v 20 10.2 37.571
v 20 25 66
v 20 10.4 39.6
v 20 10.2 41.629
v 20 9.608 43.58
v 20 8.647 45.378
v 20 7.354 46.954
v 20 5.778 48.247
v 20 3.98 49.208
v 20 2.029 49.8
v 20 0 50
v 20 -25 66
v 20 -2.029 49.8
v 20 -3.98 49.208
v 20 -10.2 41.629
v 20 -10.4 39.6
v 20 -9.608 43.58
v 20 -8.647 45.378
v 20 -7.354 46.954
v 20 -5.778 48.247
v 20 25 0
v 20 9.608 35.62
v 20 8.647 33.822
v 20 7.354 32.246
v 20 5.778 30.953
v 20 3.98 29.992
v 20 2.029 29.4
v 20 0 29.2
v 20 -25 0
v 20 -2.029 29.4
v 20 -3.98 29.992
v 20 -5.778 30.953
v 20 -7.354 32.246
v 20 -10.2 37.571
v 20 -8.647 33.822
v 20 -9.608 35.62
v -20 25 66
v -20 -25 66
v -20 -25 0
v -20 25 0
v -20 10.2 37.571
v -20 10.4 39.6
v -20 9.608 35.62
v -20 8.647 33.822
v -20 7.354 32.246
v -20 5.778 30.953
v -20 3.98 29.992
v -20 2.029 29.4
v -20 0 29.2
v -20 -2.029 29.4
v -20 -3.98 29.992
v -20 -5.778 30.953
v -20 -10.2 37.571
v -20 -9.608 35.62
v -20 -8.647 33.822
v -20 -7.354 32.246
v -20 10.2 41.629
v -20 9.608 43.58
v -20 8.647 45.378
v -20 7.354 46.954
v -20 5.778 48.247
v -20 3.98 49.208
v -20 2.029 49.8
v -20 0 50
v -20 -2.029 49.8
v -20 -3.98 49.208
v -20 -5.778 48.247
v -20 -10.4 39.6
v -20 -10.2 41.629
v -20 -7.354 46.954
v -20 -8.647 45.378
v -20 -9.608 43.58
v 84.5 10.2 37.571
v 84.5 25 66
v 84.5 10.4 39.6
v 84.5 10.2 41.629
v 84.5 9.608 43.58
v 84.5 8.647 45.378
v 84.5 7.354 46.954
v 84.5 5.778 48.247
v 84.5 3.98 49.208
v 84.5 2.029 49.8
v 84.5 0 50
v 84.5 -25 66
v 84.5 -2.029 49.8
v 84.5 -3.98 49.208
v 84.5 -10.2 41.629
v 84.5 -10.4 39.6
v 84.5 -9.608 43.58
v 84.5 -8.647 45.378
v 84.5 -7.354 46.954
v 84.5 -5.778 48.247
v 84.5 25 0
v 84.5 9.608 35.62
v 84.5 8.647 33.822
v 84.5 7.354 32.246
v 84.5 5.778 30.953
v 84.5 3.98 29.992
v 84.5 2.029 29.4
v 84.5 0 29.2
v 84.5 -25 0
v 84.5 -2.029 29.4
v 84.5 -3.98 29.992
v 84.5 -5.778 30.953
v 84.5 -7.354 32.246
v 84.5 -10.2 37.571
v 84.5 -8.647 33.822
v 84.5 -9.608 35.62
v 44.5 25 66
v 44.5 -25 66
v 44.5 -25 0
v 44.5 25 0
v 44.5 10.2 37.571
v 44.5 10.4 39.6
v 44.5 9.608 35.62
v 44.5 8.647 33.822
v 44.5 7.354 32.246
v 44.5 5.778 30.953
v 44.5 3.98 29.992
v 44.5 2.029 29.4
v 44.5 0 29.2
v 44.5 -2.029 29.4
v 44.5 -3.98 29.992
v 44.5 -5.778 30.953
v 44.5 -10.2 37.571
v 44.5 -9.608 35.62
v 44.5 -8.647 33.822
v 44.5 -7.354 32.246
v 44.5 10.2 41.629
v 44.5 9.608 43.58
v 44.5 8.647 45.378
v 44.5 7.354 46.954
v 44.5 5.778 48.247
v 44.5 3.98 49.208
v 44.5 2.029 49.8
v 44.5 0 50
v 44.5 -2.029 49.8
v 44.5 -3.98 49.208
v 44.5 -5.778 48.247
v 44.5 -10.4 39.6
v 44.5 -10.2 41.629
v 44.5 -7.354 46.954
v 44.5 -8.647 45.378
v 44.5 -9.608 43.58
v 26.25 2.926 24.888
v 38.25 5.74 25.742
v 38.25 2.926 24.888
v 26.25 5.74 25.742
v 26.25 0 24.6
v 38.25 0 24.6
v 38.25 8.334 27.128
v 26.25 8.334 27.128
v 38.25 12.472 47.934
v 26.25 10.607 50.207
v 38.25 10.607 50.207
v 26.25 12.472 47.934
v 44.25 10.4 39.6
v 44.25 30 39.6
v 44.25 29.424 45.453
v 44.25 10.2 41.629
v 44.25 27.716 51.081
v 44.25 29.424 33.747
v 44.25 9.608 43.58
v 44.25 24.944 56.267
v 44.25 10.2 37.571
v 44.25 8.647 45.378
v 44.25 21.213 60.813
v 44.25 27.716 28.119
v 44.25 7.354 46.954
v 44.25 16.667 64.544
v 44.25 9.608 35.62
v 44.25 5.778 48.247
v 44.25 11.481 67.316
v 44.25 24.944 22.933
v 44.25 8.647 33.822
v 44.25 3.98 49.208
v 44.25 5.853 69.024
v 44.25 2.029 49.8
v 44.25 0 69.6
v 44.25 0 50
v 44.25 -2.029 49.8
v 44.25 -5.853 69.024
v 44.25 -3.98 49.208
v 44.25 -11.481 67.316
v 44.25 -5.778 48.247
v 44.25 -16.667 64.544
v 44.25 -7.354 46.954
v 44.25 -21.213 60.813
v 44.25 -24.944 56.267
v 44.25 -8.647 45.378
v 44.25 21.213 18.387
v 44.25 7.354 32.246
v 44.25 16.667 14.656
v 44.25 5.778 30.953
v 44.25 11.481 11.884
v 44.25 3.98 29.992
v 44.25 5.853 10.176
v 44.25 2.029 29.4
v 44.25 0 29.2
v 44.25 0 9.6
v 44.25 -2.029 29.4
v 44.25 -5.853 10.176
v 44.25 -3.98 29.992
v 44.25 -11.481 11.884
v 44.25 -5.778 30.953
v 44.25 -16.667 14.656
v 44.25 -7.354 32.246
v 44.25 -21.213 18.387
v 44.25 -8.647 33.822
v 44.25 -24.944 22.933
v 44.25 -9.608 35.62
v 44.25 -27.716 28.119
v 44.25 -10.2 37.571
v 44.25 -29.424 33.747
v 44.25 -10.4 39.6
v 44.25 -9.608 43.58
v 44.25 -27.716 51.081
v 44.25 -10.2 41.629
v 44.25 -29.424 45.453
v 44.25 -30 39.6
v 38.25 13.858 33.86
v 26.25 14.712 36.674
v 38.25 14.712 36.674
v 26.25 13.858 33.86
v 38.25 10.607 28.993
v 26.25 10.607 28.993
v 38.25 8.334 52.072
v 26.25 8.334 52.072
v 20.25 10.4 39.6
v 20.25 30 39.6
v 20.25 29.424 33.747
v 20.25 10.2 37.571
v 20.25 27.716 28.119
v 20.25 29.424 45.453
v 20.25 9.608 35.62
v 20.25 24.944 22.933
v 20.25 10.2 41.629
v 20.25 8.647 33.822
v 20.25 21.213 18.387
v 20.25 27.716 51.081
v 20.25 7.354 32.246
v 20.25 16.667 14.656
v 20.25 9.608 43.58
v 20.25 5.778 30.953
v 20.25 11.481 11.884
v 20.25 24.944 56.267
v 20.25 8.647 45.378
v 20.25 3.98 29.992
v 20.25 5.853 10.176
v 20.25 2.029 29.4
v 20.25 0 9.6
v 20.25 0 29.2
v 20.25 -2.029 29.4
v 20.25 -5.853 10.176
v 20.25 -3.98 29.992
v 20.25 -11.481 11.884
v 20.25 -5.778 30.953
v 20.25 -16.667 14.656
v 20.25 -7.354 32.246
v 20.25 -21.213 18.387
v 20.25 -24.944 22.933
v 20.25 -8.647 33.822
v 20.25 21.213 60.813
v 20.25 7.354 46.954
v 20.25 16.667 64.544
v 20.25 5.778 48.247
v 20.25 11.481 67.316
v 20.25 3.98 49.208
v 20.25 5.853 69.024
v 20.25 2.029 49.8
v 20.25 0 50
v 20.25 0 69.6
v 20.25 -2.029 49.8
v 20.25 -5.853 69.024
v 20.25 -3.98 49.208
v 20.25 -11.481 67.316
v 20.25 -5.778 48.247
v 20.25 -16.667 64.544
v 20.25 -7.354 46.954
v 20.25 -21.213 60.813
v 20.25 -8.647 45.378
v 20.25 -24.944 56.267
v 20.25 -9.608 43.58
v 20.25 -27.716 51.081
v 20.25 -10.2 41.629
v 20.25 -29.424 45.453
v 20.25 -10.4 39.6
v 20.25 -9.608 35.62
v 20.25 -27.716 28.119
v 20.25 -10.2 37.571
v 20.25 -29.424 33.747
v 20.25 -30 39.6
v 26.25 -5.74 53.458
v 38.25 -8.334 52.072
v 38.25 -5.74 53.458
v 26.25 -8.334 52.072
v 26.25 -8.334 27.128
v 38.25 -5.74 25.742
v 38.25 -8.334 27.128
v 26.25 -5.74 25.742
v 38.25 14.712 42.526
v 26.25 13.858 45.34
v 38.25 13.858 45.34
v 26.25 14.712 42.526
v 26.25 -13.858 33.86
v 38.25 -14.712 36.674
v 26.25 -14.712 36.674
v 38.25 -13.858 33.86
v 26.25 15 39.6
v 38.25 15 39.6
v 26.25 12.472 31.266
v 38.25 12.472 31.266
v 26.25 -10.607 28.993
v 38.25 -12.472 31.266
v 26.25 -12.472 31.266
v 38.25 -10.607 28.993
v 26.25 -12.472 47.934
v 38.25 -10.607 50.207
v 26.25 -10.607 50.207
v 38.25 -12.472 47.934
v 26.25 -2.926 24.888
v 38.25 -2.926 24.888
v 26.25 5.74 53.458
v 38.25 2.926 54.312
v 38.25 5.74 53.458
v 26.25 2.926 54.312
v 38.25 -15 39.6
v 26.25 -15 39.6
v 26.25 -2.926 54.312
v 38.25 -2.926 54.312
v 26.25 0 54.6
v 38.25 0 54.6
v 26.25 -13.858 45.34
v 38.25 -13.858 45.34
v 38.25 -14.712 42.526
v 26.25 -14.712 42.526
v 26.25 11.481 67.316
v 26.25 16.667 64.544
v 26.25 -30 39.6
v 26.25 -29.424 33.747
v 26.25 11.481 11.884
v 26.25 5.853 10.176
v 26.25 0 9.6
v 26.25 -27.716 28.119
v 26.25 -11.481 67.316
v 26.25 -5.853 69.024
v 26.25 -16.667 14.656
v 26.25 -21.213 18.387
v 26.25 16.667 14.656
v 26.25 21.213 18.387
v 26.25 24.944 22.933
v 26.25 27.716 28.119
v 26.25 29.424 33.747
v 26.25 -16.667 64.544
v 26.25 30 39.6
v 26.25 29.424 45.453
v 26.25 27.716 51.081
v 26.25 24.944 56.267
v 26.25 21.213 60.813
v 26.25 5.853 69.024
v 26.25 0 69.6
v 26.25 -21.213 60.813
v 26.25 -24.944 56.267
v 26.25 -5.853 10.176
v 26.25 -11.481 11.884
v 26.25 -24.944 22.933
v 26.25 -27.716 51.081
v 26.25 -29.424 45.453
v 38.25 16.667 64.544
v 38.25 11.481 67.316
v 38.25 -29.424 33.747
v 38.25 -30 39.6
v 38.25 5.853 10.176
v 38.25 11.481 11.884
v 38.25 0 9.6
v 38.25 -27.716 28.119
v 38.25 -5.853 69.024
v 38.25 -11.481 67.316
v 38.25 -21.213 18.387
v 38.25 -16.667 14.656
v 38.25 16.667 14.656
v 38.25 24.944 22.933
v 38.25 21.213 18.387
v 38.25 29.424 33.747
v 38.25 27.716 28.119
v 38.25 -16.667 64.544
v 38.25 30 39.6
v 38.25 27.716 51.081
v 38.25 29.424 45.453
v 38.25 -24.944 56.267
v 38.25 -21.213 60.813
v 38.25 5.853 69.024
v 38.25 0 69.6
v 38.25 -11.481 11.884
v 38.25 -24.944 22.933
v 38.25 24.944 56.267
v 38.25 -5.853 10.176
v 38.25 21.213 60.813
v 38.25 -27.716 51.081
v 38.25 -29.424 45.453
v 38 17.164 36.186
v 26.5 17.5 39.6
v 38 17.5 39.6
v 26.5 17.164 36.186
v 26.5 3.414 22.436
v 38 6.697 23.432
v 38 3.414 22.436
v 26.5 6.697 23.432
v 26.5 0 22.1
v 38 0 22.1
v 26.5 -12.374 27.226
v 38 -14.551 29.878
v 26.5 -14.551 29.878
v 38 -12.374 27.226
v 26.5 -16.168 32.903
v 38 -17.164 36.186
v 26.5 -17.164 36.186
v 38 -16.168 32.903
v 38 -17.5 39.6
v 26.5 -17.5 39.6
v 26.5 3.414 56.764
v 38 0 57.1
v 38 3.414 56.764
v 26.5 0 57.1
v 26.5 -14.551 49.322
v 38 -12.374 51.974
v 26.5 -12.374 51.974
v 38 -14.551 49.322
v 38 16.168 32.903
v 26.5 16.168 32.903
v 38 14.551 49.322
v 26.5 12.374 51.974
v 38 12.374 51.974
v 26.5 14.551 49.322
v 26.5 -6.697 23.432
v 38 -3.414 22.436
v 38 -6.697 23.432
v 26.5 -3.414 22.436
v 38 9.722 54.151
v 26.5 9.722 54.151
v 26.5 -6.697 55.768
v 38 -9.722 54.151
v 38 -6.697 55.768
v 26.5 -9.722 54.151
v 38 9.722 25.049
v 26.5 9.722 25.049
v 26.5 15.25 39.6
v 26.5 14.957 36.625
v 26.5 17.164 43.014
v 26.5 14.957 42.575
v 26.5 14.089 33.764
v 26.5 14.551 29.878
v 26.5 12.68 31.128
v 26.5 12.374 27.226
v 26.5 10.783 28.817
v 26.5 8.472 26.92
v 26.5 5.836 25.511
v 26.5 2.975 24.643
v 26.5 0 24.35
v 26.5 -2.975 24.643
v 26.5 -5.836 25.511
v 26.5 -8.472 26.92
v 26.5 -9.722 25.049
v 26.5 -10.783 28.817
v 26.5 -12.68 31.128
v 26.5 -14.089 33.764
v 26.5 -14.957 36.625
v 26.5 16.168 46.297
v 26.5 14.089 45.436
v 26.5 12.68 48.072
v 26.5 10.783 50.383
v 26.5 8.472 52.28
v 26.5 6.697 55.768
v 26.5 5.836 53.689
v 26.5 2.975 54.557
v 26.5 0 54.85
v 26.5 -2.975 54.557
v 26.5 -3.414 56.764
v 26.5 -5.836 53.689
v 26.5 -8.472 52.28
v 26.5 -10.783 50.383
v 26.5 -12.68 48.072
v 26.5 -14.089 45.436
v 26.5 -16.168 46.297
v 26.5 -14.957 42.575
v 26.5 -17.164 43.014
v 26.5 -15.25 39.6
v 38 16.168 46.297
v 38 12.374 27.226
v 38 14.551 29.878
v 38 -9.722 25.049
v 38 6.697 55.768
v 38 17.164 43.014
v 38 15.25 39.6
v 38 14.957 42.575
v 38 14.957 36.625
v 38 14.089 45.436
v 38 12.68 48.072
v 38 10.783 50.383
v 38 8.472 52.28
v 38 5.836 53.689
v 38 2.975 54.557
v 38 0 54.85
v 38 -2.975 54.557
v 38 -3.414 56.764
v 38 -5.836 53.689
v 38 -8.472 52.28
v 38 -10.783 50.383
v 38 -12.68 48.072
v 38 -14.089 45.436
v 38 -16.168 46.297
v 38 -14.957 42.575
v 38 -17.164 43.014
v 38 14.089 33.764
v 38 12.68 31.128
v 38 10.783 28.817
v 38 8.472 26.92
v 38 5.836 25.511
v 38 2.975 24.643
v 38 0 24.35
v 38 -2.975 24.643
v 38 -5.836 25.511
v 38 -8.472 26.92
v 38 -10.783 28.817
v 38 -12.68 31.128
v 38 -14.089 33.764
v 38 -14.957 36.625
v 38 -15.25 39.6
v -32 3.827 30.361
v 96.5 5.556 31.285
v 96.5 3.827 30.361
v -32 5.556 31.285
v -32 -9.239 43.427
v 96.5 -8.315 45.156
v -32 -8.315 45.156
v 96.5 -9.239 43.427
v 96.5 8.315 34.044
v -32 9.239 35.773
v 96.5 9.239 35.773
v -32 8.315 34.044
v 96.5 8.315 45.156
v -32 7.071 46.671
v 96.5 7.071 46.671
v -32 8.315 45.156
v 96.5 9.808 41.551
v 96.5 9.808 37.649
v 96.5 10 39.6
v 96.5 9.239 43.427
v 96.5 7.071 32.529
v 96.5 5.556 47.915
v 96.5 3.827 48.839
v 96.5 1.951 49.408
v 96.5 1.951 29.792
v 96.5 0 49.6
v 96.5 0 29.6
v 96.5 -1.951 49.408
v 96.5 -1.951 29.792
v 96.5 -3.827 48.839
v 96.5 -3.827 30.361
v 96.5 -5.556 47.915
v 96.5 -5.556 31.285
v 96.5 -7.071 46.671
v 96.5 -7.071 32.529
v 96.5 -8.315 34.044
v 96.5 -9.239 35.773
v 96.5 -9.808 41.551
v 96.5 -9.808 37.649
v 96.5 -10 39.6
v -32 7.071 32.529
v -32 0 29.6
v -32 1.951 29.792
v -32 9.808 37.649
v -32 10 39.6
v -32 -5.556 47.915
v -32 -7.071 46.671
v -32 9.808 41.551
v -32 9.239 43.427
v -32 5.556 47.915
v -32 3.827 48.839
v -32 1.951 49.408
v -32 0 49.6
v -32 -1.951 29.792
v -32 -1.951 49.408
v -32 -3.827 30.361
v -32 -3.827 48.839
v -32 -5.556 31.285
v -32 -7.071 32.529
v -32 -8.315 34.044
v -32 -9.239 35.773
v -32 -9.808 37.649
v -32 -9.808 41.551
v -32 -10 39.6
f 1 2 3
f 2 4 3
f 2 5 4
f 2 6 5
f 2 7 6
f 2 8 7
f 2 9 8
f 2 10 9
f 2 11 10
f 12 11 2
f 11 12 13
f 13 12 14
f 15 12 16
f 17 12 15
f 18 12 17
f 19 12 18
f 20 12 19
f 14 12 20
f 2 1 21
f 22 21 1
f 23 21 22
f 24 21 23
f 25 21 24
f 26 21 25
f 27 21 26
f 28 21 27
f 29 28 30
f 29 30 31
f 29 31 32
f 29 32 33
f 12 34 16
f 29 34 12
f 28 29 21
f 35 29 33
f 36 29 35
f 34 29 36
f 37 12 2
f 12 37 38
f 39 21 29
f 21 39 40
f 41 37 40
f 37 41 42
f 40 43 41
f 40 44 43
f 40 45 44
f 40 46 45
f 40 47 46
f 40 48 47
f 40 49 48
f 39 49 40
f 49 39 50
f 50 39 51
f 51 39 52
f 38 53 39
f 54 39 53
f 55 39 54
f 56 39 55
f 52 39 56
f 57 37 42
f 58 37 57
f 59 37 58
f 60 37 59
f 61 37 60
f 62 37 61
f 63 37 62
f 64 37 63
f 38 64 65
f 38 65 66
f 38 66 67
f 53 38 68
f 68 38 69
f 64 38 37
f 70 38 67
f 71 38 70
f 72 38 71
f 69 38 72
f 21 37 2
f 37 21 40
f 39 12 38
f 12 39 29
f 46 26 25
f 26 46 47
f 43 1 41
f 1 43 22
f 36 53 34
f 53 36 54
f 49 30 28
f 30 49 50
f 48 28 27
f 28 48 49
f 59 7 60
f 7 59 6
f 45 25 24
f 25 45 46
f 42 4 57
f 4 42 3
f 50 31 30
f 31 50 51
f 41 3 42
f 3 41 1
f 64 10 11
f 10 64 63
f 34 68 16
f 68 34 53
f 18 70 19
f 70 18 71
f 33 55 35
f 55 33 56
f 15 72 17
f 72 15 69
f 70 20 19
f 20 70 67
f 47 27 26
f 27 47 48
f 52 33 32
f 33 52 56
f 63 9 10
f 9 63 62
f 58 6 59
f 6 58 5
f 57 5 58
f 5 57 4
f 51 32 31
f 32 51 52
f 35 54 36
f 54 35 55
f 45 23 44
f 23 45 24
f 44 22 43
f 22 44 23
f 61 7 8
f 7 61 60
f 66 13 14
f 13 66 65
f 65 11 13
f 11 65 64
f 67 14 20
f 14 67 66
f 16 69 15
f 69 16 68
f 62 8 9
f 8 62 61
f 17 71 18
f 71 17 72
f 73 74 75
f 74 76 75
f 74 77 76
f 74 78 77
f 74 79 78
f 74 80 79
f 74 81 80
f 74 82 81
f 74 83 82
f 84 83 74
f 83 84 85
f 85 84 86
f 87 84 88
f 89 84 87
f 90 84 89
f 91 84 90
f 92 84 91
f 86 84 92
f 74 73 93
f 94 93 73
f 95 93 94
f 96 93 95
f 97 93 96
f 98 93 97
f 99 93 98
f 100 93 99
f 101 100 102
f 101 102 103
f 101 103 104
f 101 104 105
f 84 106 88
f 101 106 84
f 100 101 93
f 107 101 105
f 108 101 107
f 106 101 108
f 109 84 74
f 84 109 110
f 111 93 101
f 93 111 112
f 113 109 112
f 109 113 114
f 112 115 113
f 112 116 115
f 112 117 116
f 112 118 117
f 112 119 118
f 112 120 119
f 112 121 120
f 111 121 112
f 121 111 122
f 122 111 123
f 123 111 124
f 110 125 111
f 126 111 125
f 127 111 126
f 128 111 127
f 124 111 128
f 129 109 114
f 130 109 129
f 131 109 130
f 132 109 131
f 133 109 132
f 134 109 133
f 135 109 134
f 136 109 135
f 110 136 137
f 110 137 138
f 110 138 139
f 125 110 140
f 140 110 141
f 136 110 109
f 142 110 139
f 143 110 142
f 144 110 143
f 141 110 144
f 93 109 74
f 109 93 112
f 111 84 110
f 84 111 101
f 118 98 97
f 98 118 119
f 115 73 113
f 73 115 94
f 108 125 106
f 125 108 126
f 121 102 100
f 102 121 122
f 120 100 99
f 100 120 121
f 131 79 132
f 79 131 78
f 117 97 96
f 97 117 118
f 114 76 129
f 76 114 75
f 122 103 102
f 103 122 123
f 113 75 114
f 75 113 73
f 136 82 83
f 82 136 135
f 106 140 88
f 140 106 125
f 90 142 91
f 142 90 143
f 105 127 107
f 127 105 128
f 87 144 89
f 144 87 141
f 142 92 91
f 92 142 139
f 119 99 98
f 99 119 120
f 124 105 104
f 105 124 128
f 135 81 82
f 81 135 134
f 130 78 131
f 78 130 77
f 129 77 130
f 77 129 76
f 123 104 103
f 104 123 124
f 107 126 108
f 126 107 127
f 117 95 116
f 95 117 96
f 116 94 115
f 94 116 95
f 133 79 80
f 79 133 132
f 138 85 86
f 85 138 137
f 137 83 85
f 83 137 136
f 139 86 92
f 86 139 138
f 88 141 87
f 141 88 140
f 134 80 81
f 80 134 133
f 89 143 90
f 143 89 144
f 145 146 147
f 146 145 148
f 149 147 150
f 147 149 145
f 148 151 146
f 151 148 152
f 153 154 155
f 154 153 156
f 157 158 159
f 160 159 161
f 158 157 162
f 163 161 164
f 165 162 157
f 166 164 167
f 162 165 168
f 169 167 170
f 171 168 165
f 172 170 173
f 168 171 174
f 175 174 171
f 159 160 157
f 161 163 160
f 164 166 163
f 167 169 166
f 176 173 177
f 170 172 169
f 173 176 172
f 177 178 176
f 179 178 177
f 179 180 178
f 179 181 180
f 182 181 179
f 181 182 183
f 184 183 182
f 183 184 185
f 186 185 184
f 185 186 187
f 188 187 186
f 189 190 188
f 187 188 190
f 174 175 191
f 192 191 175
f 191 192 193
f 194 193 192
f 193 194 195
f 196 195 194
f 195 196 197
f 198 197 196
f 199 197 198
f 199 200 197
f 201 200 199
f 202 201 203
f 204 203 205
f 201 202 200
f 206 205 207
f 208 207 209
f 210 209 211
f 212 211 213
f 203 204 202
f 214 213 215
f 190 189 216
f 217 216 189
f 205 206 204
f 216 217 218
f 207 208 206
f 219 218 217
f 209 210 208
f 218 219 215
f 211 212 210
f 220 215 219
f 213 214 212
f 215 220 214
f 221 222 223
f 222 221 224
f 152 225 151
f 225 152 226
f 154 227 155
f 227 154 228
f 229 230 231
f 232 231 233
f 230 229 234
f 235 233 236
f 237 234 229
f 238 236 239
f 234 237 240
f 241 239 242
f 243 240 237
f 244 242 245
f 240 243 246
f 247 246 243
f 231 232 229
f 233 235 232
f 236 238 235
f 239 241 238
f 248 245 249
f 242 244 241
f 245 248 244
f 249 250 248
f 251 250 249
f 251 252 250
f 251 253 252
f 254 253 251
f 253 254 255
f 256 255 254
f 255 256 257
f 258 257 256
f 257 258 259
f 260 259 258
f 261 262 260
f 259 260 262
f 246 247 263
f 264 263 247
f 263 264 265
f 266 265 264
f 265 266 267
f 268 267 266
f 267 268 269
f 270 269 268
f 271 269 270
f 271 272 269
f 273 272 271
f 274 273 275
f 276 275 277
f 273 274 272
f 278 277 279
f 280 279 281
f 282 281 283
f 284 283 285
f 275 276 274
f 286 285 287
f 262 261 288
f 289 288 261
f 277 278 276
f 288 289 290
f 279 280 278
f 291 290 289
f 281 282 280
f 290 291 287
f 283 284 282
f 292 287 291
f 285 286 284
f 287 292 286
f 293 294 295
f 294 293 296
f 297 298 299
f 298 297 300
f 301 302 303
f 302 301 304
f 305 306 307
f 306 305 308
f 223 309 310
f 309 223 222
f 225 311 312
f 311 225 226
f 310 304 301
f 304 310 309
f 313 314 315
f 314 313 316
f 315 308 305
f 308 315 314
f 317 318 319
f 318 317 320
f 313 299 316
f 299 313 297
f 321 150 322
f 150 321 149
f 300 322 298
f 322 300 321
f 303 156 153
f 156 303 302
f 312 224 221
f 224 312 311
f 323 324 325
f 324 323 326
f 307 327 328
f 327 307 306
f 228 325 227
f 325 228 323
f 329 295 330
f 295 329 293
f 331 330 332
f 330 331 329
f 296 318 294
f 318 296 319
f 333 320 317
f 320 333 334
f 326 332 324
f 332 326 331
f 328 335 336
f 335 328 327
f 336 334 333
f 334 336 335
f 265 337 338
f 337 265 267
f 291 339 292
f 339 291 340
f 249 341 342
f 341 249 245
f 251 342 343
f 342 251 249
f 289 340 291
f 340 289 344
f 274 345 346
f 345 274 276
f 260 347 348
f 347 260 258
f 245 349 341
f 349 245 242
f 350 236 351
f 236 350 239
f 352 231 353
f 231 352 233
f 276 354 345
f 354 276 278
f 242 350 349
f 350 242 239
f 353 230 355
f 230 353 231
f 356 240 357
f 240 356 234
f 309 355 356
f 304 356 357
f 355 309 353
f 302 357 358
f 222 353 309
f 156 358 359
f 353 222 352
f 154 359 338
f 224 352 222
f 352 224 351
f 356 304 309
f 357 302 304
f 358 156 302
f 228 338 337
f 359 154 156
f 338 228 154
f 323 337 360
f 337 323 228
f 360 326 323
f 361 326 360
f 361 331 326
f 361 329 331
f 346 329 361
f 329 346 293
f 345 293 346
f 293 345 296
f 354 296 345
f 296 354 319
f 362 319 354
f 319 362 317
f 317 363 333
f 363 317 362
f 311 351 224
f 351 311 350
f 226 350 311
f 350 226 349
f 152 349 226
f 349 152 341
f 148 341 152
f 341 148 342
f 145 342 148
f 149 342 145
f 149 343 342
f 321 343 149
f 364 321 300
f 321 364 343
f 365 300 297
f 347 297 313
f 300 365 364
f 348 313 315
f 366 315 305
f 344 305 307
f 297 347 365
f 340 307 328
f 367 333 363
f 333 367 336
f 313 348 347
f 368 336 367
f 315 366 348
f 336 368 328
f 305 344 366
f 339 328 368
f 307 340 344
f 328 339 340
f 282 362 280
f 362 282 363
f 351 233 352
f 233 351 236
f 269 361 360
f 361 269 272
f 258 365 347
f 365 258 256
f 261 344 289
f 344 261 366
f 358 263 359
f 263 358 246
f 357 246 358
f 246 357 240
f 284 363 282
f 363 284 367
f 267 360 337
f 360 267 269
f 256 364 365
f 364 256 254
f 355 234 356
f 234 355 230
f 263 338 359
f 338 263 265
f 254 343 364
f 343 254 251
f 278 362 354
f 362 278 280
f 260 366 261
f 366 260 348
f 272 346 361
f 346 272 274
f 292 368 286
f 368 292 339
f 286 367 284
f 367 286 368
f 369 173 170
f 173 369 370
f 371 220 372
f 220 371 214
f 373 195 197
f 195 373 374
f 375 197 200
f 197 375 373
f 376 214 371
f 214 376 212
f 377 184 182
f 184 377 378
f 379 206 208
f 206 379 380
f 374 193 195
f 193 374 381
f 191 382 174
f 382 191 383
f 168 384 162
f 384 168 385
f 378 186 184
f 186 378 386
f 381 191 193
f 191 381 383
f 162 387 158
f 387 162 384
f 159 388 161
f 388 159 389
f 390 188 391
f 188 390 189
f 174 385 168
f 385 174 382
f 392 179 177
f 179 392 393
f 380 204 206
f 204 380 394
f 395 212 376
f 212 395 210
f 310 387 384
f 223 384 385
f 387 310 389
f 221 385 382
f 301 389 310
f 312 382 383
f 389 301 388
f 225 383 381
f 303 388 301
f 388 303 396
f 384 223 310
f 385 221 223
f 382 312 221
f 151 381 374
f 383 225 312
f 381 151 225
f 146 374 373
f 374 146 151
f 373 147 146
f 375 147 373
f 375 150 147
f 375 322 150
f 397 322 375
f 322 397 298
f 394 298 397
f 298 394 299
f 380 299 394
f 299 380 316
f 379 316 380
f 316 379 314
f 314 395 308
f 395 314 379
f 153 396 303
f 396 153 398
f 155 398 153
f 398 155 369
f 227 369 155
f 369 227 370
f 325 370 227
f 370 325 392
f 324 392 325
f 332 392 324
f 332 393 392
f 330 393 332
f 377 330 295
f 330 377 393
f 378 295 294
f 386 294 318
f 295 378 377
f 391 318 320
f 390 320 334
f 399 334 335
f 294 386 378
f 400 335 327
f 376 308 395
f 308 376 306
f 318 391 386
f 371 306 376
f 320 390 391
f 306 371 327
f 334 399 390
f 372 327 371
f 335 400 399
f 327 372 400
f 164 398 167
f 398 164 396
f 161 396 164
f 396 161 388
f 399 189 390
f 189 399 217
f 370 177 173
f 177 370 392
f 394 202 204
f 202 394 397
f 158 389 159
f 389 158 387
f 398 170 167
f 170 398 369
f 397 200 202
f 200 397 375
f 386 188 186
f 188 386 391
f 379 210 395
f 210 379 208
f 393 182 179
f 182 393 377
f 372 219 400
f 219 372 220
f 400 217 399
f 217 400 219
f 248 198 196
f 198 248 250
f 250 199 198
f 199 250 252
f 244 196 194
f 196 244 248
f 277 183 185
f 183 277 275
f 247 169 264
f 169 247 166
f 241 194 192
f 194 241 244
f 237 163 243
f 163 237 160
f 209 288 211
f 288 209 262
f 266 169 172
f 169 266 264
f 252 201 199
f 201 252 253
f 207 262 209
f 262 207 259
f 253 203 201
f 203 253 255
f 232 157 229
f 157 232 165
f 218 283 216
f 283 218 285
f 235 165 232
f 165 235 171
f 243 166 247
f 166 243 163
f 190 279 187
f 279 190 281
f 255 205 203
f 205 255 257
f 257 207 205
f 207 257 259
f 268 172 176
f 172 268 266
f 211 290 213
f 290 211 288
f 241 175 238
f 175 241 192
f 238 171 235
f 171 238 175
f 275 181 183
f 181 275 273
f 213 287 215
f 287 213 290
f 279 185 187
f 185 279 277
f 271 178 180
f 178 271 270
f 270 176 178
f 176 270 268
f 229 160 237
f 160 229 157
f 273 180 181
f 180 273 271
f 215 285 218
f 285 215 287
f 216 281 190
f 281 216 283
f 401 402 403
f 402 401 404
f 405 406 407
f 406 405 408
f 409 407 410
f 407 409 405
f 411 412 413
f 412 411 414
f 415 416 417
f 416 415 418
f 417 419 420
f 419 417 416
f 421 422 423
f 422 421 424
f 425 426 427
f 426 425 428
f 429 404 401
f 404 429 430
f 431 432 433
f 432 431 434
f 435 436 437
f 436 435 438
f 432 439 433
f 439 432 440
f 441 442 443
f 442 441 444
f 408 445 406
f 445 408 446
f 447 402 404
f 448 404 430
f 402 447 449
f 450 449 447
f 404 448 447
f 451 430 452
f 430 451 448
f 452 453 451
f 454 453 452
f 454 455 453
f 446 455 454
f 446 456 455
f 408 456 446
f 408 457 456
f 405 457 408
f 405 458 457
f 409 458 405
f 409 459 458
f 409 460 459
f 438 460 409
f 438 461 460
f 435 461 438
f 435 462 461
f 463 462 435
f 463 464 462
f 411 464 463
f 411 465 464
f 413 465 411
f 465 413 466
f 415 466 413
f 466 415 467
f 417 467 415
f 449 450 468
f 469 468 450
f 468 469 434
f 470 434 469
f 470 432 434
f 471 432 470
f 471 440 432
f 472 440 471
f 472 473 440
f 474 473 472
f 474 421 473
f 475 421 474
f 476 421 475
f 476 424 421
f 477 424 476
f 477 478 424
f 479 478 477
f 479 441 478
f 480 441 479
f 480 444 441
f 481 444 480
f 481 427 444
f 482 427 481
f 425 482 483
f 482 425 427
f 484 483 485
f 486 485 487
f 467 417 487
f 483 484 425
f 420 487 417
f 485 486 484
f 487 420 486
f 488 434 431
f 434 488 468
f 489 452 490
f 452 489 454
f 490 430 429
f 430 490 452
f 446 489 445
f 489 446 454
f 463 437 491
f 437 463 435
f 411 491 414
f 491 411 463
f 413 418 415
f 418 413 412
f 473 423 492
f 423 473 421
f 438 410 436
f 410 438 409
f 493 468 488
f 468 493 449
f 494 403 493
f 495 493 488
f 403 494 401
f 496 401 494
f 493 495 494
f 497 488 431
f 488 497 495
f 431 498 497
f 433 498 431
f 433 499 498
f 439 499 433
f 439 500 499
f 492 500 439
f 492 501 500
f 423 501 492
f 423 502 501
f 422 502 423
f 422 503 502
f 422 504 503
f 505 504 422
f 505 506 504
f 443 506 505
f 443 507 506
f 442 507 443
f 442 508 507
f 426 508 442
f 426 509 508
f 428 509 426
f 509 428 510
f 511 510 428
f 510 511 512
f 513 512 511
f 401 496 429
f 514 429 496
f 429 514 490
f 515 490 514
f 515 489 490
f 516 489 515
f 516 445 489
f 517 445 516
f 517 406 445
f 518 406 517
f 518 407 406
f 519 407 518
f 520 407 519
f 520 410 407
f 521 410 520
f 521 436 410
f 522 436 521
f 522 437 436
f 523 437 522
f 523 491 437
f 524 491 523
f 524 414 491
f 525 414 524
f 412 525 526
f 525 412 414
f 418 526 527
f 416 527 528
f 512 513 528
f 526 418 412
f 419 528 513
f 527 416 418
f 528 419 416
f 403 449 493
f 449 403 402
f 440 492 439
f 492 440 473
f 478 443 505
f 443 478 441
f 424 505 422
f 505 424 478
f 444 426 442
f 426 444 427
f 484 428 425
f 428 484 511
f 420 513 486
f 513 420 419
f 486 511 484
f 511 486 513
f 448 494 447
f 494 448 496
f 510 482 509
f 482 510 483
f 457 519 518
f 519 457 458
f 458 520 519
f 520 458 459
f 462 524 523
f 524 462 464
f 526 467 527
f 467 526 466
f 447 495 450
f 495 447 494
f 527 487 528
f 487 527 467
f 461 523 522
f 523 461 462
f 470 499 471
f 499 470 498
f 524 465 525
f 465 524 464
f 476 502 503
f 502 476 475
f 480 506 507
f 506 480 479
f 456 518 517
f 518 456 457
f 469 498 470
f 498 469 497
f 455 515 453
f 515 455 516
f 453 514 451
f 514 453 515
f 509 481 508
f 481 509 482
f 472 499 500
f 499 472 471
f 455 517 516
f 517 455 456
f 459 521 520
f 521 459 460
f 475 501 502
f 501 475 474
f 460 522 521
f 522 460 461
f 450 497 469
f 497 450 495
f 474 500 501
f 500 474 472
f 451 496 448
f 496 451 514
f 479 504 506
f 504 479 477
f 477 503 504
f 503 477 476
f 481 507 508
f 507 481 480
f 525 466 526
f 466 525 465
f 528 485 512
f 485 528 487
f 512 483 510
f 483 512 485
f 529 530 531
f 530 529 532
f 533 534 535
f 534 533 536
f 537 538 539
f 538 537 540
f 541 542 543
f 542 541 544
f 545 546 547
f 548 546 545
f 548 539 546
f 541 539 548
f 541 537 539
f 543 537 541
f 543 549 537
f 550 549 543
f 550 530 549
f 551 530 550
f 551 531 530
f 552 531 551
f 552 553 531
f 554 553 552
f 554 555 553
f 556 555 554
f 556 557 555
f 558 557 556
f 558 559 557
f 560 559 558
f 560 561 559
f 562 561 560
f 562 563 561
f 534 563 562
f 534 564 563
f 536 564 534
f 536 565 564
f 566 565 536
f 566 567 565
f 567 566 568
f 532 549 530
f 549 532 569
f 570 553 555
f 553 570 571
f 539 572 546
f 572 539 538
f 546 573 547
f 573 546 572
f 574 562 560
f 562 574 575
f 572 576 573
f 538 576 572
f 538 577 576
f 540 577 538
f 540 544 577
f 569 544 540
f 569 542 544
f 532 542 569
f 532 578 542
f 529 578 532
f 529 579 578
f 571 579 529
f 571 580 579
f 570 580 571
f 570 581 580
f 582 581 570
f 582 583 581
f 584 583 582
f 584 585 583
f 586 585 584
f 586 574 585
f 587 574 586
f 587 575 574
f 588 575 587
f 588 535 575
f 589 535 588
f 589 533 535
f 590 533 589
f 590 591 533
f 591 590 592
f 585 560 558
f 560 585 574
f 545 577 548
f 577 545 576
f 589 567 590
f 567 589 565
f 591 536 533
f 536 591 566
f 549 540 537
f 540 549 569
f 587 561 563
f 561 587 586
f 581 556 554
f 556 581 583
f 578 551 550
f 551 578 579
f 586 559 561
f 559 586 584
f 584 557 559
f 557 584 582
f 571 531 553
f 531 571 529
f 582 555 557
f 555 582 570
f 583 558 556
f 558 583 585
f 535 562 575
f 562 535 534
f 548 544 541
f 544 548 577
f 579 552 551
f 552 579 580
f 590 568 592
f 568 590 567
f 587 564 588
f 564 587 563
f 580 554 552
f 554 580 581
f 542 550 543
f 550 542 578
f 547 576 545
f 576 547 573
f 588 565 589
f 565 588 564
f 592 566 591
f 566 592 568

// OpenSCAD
$fn = 32;

// ------------------------------------------------------------------------
// Pulley assembly: d60 pulley with a belt, shaft d20
// Every part is its own module, assembly() places them once.
// ------------------------------------------------------------------------

// --- part 1 ---
module support1() {
  difference() {
    translate([-20, -25, 0]) cube([40, 50, 66]);
    translate([0, 0, 39.6]) rotate([0, 90, 0]) cylinder(h = 42, d = 20.8, center = true);
  }
}

// --- part 2 ---
module support2() {
  difference() {
    translate([-20, -25, 0]) cube([40, 50, 66]);
    translate([0, 0, 39.6]) rotate([0, 90, 0]) cylinder(h = 42, d = 20.8, center = true);
  }
}

// --- part 3 ---
module shaft() {
  translate([0, 0, -64.25]) cylinder(h = 128.5, d = 20);
}

// --- part 4 ---
module pulley() {
  difference() {
    union() {
      cylinder(h = 24, d = 30);
      cylinder(h = 6, d = 60);
      translate([0, 0, 18]) cylinder(h = 6, d = 60);
    }
    translate([0, 0, -1]) cylinder(h = 26, d = 20.8);
  }
}

// --- part 5 ---
module belt() {
  difference() {
      translate([0, 0, 0]) cylinder(h = 11.5, d = 35);
      translate([0, 0, -1]) cylinder(h = 13.5, d = 30.5);
    }
}

// --- assembly ---
module assembly() {
  translate([0, 0, 0]) rotate([0, 0, 0]) support1();
  translate([64.5, 0, 0]) rotate([0, 0, 0]) support2();
  translate([32.25, 0, 39.6]) rotate([0, 90, 0]) shaft();
  translate([20.25, 0, 39.6]) rotate([0, 90, 0]) pulley();
  translate([26.5, 0, 39.6]) rotate([0, 90, 0]) belt();
}

assembly();
